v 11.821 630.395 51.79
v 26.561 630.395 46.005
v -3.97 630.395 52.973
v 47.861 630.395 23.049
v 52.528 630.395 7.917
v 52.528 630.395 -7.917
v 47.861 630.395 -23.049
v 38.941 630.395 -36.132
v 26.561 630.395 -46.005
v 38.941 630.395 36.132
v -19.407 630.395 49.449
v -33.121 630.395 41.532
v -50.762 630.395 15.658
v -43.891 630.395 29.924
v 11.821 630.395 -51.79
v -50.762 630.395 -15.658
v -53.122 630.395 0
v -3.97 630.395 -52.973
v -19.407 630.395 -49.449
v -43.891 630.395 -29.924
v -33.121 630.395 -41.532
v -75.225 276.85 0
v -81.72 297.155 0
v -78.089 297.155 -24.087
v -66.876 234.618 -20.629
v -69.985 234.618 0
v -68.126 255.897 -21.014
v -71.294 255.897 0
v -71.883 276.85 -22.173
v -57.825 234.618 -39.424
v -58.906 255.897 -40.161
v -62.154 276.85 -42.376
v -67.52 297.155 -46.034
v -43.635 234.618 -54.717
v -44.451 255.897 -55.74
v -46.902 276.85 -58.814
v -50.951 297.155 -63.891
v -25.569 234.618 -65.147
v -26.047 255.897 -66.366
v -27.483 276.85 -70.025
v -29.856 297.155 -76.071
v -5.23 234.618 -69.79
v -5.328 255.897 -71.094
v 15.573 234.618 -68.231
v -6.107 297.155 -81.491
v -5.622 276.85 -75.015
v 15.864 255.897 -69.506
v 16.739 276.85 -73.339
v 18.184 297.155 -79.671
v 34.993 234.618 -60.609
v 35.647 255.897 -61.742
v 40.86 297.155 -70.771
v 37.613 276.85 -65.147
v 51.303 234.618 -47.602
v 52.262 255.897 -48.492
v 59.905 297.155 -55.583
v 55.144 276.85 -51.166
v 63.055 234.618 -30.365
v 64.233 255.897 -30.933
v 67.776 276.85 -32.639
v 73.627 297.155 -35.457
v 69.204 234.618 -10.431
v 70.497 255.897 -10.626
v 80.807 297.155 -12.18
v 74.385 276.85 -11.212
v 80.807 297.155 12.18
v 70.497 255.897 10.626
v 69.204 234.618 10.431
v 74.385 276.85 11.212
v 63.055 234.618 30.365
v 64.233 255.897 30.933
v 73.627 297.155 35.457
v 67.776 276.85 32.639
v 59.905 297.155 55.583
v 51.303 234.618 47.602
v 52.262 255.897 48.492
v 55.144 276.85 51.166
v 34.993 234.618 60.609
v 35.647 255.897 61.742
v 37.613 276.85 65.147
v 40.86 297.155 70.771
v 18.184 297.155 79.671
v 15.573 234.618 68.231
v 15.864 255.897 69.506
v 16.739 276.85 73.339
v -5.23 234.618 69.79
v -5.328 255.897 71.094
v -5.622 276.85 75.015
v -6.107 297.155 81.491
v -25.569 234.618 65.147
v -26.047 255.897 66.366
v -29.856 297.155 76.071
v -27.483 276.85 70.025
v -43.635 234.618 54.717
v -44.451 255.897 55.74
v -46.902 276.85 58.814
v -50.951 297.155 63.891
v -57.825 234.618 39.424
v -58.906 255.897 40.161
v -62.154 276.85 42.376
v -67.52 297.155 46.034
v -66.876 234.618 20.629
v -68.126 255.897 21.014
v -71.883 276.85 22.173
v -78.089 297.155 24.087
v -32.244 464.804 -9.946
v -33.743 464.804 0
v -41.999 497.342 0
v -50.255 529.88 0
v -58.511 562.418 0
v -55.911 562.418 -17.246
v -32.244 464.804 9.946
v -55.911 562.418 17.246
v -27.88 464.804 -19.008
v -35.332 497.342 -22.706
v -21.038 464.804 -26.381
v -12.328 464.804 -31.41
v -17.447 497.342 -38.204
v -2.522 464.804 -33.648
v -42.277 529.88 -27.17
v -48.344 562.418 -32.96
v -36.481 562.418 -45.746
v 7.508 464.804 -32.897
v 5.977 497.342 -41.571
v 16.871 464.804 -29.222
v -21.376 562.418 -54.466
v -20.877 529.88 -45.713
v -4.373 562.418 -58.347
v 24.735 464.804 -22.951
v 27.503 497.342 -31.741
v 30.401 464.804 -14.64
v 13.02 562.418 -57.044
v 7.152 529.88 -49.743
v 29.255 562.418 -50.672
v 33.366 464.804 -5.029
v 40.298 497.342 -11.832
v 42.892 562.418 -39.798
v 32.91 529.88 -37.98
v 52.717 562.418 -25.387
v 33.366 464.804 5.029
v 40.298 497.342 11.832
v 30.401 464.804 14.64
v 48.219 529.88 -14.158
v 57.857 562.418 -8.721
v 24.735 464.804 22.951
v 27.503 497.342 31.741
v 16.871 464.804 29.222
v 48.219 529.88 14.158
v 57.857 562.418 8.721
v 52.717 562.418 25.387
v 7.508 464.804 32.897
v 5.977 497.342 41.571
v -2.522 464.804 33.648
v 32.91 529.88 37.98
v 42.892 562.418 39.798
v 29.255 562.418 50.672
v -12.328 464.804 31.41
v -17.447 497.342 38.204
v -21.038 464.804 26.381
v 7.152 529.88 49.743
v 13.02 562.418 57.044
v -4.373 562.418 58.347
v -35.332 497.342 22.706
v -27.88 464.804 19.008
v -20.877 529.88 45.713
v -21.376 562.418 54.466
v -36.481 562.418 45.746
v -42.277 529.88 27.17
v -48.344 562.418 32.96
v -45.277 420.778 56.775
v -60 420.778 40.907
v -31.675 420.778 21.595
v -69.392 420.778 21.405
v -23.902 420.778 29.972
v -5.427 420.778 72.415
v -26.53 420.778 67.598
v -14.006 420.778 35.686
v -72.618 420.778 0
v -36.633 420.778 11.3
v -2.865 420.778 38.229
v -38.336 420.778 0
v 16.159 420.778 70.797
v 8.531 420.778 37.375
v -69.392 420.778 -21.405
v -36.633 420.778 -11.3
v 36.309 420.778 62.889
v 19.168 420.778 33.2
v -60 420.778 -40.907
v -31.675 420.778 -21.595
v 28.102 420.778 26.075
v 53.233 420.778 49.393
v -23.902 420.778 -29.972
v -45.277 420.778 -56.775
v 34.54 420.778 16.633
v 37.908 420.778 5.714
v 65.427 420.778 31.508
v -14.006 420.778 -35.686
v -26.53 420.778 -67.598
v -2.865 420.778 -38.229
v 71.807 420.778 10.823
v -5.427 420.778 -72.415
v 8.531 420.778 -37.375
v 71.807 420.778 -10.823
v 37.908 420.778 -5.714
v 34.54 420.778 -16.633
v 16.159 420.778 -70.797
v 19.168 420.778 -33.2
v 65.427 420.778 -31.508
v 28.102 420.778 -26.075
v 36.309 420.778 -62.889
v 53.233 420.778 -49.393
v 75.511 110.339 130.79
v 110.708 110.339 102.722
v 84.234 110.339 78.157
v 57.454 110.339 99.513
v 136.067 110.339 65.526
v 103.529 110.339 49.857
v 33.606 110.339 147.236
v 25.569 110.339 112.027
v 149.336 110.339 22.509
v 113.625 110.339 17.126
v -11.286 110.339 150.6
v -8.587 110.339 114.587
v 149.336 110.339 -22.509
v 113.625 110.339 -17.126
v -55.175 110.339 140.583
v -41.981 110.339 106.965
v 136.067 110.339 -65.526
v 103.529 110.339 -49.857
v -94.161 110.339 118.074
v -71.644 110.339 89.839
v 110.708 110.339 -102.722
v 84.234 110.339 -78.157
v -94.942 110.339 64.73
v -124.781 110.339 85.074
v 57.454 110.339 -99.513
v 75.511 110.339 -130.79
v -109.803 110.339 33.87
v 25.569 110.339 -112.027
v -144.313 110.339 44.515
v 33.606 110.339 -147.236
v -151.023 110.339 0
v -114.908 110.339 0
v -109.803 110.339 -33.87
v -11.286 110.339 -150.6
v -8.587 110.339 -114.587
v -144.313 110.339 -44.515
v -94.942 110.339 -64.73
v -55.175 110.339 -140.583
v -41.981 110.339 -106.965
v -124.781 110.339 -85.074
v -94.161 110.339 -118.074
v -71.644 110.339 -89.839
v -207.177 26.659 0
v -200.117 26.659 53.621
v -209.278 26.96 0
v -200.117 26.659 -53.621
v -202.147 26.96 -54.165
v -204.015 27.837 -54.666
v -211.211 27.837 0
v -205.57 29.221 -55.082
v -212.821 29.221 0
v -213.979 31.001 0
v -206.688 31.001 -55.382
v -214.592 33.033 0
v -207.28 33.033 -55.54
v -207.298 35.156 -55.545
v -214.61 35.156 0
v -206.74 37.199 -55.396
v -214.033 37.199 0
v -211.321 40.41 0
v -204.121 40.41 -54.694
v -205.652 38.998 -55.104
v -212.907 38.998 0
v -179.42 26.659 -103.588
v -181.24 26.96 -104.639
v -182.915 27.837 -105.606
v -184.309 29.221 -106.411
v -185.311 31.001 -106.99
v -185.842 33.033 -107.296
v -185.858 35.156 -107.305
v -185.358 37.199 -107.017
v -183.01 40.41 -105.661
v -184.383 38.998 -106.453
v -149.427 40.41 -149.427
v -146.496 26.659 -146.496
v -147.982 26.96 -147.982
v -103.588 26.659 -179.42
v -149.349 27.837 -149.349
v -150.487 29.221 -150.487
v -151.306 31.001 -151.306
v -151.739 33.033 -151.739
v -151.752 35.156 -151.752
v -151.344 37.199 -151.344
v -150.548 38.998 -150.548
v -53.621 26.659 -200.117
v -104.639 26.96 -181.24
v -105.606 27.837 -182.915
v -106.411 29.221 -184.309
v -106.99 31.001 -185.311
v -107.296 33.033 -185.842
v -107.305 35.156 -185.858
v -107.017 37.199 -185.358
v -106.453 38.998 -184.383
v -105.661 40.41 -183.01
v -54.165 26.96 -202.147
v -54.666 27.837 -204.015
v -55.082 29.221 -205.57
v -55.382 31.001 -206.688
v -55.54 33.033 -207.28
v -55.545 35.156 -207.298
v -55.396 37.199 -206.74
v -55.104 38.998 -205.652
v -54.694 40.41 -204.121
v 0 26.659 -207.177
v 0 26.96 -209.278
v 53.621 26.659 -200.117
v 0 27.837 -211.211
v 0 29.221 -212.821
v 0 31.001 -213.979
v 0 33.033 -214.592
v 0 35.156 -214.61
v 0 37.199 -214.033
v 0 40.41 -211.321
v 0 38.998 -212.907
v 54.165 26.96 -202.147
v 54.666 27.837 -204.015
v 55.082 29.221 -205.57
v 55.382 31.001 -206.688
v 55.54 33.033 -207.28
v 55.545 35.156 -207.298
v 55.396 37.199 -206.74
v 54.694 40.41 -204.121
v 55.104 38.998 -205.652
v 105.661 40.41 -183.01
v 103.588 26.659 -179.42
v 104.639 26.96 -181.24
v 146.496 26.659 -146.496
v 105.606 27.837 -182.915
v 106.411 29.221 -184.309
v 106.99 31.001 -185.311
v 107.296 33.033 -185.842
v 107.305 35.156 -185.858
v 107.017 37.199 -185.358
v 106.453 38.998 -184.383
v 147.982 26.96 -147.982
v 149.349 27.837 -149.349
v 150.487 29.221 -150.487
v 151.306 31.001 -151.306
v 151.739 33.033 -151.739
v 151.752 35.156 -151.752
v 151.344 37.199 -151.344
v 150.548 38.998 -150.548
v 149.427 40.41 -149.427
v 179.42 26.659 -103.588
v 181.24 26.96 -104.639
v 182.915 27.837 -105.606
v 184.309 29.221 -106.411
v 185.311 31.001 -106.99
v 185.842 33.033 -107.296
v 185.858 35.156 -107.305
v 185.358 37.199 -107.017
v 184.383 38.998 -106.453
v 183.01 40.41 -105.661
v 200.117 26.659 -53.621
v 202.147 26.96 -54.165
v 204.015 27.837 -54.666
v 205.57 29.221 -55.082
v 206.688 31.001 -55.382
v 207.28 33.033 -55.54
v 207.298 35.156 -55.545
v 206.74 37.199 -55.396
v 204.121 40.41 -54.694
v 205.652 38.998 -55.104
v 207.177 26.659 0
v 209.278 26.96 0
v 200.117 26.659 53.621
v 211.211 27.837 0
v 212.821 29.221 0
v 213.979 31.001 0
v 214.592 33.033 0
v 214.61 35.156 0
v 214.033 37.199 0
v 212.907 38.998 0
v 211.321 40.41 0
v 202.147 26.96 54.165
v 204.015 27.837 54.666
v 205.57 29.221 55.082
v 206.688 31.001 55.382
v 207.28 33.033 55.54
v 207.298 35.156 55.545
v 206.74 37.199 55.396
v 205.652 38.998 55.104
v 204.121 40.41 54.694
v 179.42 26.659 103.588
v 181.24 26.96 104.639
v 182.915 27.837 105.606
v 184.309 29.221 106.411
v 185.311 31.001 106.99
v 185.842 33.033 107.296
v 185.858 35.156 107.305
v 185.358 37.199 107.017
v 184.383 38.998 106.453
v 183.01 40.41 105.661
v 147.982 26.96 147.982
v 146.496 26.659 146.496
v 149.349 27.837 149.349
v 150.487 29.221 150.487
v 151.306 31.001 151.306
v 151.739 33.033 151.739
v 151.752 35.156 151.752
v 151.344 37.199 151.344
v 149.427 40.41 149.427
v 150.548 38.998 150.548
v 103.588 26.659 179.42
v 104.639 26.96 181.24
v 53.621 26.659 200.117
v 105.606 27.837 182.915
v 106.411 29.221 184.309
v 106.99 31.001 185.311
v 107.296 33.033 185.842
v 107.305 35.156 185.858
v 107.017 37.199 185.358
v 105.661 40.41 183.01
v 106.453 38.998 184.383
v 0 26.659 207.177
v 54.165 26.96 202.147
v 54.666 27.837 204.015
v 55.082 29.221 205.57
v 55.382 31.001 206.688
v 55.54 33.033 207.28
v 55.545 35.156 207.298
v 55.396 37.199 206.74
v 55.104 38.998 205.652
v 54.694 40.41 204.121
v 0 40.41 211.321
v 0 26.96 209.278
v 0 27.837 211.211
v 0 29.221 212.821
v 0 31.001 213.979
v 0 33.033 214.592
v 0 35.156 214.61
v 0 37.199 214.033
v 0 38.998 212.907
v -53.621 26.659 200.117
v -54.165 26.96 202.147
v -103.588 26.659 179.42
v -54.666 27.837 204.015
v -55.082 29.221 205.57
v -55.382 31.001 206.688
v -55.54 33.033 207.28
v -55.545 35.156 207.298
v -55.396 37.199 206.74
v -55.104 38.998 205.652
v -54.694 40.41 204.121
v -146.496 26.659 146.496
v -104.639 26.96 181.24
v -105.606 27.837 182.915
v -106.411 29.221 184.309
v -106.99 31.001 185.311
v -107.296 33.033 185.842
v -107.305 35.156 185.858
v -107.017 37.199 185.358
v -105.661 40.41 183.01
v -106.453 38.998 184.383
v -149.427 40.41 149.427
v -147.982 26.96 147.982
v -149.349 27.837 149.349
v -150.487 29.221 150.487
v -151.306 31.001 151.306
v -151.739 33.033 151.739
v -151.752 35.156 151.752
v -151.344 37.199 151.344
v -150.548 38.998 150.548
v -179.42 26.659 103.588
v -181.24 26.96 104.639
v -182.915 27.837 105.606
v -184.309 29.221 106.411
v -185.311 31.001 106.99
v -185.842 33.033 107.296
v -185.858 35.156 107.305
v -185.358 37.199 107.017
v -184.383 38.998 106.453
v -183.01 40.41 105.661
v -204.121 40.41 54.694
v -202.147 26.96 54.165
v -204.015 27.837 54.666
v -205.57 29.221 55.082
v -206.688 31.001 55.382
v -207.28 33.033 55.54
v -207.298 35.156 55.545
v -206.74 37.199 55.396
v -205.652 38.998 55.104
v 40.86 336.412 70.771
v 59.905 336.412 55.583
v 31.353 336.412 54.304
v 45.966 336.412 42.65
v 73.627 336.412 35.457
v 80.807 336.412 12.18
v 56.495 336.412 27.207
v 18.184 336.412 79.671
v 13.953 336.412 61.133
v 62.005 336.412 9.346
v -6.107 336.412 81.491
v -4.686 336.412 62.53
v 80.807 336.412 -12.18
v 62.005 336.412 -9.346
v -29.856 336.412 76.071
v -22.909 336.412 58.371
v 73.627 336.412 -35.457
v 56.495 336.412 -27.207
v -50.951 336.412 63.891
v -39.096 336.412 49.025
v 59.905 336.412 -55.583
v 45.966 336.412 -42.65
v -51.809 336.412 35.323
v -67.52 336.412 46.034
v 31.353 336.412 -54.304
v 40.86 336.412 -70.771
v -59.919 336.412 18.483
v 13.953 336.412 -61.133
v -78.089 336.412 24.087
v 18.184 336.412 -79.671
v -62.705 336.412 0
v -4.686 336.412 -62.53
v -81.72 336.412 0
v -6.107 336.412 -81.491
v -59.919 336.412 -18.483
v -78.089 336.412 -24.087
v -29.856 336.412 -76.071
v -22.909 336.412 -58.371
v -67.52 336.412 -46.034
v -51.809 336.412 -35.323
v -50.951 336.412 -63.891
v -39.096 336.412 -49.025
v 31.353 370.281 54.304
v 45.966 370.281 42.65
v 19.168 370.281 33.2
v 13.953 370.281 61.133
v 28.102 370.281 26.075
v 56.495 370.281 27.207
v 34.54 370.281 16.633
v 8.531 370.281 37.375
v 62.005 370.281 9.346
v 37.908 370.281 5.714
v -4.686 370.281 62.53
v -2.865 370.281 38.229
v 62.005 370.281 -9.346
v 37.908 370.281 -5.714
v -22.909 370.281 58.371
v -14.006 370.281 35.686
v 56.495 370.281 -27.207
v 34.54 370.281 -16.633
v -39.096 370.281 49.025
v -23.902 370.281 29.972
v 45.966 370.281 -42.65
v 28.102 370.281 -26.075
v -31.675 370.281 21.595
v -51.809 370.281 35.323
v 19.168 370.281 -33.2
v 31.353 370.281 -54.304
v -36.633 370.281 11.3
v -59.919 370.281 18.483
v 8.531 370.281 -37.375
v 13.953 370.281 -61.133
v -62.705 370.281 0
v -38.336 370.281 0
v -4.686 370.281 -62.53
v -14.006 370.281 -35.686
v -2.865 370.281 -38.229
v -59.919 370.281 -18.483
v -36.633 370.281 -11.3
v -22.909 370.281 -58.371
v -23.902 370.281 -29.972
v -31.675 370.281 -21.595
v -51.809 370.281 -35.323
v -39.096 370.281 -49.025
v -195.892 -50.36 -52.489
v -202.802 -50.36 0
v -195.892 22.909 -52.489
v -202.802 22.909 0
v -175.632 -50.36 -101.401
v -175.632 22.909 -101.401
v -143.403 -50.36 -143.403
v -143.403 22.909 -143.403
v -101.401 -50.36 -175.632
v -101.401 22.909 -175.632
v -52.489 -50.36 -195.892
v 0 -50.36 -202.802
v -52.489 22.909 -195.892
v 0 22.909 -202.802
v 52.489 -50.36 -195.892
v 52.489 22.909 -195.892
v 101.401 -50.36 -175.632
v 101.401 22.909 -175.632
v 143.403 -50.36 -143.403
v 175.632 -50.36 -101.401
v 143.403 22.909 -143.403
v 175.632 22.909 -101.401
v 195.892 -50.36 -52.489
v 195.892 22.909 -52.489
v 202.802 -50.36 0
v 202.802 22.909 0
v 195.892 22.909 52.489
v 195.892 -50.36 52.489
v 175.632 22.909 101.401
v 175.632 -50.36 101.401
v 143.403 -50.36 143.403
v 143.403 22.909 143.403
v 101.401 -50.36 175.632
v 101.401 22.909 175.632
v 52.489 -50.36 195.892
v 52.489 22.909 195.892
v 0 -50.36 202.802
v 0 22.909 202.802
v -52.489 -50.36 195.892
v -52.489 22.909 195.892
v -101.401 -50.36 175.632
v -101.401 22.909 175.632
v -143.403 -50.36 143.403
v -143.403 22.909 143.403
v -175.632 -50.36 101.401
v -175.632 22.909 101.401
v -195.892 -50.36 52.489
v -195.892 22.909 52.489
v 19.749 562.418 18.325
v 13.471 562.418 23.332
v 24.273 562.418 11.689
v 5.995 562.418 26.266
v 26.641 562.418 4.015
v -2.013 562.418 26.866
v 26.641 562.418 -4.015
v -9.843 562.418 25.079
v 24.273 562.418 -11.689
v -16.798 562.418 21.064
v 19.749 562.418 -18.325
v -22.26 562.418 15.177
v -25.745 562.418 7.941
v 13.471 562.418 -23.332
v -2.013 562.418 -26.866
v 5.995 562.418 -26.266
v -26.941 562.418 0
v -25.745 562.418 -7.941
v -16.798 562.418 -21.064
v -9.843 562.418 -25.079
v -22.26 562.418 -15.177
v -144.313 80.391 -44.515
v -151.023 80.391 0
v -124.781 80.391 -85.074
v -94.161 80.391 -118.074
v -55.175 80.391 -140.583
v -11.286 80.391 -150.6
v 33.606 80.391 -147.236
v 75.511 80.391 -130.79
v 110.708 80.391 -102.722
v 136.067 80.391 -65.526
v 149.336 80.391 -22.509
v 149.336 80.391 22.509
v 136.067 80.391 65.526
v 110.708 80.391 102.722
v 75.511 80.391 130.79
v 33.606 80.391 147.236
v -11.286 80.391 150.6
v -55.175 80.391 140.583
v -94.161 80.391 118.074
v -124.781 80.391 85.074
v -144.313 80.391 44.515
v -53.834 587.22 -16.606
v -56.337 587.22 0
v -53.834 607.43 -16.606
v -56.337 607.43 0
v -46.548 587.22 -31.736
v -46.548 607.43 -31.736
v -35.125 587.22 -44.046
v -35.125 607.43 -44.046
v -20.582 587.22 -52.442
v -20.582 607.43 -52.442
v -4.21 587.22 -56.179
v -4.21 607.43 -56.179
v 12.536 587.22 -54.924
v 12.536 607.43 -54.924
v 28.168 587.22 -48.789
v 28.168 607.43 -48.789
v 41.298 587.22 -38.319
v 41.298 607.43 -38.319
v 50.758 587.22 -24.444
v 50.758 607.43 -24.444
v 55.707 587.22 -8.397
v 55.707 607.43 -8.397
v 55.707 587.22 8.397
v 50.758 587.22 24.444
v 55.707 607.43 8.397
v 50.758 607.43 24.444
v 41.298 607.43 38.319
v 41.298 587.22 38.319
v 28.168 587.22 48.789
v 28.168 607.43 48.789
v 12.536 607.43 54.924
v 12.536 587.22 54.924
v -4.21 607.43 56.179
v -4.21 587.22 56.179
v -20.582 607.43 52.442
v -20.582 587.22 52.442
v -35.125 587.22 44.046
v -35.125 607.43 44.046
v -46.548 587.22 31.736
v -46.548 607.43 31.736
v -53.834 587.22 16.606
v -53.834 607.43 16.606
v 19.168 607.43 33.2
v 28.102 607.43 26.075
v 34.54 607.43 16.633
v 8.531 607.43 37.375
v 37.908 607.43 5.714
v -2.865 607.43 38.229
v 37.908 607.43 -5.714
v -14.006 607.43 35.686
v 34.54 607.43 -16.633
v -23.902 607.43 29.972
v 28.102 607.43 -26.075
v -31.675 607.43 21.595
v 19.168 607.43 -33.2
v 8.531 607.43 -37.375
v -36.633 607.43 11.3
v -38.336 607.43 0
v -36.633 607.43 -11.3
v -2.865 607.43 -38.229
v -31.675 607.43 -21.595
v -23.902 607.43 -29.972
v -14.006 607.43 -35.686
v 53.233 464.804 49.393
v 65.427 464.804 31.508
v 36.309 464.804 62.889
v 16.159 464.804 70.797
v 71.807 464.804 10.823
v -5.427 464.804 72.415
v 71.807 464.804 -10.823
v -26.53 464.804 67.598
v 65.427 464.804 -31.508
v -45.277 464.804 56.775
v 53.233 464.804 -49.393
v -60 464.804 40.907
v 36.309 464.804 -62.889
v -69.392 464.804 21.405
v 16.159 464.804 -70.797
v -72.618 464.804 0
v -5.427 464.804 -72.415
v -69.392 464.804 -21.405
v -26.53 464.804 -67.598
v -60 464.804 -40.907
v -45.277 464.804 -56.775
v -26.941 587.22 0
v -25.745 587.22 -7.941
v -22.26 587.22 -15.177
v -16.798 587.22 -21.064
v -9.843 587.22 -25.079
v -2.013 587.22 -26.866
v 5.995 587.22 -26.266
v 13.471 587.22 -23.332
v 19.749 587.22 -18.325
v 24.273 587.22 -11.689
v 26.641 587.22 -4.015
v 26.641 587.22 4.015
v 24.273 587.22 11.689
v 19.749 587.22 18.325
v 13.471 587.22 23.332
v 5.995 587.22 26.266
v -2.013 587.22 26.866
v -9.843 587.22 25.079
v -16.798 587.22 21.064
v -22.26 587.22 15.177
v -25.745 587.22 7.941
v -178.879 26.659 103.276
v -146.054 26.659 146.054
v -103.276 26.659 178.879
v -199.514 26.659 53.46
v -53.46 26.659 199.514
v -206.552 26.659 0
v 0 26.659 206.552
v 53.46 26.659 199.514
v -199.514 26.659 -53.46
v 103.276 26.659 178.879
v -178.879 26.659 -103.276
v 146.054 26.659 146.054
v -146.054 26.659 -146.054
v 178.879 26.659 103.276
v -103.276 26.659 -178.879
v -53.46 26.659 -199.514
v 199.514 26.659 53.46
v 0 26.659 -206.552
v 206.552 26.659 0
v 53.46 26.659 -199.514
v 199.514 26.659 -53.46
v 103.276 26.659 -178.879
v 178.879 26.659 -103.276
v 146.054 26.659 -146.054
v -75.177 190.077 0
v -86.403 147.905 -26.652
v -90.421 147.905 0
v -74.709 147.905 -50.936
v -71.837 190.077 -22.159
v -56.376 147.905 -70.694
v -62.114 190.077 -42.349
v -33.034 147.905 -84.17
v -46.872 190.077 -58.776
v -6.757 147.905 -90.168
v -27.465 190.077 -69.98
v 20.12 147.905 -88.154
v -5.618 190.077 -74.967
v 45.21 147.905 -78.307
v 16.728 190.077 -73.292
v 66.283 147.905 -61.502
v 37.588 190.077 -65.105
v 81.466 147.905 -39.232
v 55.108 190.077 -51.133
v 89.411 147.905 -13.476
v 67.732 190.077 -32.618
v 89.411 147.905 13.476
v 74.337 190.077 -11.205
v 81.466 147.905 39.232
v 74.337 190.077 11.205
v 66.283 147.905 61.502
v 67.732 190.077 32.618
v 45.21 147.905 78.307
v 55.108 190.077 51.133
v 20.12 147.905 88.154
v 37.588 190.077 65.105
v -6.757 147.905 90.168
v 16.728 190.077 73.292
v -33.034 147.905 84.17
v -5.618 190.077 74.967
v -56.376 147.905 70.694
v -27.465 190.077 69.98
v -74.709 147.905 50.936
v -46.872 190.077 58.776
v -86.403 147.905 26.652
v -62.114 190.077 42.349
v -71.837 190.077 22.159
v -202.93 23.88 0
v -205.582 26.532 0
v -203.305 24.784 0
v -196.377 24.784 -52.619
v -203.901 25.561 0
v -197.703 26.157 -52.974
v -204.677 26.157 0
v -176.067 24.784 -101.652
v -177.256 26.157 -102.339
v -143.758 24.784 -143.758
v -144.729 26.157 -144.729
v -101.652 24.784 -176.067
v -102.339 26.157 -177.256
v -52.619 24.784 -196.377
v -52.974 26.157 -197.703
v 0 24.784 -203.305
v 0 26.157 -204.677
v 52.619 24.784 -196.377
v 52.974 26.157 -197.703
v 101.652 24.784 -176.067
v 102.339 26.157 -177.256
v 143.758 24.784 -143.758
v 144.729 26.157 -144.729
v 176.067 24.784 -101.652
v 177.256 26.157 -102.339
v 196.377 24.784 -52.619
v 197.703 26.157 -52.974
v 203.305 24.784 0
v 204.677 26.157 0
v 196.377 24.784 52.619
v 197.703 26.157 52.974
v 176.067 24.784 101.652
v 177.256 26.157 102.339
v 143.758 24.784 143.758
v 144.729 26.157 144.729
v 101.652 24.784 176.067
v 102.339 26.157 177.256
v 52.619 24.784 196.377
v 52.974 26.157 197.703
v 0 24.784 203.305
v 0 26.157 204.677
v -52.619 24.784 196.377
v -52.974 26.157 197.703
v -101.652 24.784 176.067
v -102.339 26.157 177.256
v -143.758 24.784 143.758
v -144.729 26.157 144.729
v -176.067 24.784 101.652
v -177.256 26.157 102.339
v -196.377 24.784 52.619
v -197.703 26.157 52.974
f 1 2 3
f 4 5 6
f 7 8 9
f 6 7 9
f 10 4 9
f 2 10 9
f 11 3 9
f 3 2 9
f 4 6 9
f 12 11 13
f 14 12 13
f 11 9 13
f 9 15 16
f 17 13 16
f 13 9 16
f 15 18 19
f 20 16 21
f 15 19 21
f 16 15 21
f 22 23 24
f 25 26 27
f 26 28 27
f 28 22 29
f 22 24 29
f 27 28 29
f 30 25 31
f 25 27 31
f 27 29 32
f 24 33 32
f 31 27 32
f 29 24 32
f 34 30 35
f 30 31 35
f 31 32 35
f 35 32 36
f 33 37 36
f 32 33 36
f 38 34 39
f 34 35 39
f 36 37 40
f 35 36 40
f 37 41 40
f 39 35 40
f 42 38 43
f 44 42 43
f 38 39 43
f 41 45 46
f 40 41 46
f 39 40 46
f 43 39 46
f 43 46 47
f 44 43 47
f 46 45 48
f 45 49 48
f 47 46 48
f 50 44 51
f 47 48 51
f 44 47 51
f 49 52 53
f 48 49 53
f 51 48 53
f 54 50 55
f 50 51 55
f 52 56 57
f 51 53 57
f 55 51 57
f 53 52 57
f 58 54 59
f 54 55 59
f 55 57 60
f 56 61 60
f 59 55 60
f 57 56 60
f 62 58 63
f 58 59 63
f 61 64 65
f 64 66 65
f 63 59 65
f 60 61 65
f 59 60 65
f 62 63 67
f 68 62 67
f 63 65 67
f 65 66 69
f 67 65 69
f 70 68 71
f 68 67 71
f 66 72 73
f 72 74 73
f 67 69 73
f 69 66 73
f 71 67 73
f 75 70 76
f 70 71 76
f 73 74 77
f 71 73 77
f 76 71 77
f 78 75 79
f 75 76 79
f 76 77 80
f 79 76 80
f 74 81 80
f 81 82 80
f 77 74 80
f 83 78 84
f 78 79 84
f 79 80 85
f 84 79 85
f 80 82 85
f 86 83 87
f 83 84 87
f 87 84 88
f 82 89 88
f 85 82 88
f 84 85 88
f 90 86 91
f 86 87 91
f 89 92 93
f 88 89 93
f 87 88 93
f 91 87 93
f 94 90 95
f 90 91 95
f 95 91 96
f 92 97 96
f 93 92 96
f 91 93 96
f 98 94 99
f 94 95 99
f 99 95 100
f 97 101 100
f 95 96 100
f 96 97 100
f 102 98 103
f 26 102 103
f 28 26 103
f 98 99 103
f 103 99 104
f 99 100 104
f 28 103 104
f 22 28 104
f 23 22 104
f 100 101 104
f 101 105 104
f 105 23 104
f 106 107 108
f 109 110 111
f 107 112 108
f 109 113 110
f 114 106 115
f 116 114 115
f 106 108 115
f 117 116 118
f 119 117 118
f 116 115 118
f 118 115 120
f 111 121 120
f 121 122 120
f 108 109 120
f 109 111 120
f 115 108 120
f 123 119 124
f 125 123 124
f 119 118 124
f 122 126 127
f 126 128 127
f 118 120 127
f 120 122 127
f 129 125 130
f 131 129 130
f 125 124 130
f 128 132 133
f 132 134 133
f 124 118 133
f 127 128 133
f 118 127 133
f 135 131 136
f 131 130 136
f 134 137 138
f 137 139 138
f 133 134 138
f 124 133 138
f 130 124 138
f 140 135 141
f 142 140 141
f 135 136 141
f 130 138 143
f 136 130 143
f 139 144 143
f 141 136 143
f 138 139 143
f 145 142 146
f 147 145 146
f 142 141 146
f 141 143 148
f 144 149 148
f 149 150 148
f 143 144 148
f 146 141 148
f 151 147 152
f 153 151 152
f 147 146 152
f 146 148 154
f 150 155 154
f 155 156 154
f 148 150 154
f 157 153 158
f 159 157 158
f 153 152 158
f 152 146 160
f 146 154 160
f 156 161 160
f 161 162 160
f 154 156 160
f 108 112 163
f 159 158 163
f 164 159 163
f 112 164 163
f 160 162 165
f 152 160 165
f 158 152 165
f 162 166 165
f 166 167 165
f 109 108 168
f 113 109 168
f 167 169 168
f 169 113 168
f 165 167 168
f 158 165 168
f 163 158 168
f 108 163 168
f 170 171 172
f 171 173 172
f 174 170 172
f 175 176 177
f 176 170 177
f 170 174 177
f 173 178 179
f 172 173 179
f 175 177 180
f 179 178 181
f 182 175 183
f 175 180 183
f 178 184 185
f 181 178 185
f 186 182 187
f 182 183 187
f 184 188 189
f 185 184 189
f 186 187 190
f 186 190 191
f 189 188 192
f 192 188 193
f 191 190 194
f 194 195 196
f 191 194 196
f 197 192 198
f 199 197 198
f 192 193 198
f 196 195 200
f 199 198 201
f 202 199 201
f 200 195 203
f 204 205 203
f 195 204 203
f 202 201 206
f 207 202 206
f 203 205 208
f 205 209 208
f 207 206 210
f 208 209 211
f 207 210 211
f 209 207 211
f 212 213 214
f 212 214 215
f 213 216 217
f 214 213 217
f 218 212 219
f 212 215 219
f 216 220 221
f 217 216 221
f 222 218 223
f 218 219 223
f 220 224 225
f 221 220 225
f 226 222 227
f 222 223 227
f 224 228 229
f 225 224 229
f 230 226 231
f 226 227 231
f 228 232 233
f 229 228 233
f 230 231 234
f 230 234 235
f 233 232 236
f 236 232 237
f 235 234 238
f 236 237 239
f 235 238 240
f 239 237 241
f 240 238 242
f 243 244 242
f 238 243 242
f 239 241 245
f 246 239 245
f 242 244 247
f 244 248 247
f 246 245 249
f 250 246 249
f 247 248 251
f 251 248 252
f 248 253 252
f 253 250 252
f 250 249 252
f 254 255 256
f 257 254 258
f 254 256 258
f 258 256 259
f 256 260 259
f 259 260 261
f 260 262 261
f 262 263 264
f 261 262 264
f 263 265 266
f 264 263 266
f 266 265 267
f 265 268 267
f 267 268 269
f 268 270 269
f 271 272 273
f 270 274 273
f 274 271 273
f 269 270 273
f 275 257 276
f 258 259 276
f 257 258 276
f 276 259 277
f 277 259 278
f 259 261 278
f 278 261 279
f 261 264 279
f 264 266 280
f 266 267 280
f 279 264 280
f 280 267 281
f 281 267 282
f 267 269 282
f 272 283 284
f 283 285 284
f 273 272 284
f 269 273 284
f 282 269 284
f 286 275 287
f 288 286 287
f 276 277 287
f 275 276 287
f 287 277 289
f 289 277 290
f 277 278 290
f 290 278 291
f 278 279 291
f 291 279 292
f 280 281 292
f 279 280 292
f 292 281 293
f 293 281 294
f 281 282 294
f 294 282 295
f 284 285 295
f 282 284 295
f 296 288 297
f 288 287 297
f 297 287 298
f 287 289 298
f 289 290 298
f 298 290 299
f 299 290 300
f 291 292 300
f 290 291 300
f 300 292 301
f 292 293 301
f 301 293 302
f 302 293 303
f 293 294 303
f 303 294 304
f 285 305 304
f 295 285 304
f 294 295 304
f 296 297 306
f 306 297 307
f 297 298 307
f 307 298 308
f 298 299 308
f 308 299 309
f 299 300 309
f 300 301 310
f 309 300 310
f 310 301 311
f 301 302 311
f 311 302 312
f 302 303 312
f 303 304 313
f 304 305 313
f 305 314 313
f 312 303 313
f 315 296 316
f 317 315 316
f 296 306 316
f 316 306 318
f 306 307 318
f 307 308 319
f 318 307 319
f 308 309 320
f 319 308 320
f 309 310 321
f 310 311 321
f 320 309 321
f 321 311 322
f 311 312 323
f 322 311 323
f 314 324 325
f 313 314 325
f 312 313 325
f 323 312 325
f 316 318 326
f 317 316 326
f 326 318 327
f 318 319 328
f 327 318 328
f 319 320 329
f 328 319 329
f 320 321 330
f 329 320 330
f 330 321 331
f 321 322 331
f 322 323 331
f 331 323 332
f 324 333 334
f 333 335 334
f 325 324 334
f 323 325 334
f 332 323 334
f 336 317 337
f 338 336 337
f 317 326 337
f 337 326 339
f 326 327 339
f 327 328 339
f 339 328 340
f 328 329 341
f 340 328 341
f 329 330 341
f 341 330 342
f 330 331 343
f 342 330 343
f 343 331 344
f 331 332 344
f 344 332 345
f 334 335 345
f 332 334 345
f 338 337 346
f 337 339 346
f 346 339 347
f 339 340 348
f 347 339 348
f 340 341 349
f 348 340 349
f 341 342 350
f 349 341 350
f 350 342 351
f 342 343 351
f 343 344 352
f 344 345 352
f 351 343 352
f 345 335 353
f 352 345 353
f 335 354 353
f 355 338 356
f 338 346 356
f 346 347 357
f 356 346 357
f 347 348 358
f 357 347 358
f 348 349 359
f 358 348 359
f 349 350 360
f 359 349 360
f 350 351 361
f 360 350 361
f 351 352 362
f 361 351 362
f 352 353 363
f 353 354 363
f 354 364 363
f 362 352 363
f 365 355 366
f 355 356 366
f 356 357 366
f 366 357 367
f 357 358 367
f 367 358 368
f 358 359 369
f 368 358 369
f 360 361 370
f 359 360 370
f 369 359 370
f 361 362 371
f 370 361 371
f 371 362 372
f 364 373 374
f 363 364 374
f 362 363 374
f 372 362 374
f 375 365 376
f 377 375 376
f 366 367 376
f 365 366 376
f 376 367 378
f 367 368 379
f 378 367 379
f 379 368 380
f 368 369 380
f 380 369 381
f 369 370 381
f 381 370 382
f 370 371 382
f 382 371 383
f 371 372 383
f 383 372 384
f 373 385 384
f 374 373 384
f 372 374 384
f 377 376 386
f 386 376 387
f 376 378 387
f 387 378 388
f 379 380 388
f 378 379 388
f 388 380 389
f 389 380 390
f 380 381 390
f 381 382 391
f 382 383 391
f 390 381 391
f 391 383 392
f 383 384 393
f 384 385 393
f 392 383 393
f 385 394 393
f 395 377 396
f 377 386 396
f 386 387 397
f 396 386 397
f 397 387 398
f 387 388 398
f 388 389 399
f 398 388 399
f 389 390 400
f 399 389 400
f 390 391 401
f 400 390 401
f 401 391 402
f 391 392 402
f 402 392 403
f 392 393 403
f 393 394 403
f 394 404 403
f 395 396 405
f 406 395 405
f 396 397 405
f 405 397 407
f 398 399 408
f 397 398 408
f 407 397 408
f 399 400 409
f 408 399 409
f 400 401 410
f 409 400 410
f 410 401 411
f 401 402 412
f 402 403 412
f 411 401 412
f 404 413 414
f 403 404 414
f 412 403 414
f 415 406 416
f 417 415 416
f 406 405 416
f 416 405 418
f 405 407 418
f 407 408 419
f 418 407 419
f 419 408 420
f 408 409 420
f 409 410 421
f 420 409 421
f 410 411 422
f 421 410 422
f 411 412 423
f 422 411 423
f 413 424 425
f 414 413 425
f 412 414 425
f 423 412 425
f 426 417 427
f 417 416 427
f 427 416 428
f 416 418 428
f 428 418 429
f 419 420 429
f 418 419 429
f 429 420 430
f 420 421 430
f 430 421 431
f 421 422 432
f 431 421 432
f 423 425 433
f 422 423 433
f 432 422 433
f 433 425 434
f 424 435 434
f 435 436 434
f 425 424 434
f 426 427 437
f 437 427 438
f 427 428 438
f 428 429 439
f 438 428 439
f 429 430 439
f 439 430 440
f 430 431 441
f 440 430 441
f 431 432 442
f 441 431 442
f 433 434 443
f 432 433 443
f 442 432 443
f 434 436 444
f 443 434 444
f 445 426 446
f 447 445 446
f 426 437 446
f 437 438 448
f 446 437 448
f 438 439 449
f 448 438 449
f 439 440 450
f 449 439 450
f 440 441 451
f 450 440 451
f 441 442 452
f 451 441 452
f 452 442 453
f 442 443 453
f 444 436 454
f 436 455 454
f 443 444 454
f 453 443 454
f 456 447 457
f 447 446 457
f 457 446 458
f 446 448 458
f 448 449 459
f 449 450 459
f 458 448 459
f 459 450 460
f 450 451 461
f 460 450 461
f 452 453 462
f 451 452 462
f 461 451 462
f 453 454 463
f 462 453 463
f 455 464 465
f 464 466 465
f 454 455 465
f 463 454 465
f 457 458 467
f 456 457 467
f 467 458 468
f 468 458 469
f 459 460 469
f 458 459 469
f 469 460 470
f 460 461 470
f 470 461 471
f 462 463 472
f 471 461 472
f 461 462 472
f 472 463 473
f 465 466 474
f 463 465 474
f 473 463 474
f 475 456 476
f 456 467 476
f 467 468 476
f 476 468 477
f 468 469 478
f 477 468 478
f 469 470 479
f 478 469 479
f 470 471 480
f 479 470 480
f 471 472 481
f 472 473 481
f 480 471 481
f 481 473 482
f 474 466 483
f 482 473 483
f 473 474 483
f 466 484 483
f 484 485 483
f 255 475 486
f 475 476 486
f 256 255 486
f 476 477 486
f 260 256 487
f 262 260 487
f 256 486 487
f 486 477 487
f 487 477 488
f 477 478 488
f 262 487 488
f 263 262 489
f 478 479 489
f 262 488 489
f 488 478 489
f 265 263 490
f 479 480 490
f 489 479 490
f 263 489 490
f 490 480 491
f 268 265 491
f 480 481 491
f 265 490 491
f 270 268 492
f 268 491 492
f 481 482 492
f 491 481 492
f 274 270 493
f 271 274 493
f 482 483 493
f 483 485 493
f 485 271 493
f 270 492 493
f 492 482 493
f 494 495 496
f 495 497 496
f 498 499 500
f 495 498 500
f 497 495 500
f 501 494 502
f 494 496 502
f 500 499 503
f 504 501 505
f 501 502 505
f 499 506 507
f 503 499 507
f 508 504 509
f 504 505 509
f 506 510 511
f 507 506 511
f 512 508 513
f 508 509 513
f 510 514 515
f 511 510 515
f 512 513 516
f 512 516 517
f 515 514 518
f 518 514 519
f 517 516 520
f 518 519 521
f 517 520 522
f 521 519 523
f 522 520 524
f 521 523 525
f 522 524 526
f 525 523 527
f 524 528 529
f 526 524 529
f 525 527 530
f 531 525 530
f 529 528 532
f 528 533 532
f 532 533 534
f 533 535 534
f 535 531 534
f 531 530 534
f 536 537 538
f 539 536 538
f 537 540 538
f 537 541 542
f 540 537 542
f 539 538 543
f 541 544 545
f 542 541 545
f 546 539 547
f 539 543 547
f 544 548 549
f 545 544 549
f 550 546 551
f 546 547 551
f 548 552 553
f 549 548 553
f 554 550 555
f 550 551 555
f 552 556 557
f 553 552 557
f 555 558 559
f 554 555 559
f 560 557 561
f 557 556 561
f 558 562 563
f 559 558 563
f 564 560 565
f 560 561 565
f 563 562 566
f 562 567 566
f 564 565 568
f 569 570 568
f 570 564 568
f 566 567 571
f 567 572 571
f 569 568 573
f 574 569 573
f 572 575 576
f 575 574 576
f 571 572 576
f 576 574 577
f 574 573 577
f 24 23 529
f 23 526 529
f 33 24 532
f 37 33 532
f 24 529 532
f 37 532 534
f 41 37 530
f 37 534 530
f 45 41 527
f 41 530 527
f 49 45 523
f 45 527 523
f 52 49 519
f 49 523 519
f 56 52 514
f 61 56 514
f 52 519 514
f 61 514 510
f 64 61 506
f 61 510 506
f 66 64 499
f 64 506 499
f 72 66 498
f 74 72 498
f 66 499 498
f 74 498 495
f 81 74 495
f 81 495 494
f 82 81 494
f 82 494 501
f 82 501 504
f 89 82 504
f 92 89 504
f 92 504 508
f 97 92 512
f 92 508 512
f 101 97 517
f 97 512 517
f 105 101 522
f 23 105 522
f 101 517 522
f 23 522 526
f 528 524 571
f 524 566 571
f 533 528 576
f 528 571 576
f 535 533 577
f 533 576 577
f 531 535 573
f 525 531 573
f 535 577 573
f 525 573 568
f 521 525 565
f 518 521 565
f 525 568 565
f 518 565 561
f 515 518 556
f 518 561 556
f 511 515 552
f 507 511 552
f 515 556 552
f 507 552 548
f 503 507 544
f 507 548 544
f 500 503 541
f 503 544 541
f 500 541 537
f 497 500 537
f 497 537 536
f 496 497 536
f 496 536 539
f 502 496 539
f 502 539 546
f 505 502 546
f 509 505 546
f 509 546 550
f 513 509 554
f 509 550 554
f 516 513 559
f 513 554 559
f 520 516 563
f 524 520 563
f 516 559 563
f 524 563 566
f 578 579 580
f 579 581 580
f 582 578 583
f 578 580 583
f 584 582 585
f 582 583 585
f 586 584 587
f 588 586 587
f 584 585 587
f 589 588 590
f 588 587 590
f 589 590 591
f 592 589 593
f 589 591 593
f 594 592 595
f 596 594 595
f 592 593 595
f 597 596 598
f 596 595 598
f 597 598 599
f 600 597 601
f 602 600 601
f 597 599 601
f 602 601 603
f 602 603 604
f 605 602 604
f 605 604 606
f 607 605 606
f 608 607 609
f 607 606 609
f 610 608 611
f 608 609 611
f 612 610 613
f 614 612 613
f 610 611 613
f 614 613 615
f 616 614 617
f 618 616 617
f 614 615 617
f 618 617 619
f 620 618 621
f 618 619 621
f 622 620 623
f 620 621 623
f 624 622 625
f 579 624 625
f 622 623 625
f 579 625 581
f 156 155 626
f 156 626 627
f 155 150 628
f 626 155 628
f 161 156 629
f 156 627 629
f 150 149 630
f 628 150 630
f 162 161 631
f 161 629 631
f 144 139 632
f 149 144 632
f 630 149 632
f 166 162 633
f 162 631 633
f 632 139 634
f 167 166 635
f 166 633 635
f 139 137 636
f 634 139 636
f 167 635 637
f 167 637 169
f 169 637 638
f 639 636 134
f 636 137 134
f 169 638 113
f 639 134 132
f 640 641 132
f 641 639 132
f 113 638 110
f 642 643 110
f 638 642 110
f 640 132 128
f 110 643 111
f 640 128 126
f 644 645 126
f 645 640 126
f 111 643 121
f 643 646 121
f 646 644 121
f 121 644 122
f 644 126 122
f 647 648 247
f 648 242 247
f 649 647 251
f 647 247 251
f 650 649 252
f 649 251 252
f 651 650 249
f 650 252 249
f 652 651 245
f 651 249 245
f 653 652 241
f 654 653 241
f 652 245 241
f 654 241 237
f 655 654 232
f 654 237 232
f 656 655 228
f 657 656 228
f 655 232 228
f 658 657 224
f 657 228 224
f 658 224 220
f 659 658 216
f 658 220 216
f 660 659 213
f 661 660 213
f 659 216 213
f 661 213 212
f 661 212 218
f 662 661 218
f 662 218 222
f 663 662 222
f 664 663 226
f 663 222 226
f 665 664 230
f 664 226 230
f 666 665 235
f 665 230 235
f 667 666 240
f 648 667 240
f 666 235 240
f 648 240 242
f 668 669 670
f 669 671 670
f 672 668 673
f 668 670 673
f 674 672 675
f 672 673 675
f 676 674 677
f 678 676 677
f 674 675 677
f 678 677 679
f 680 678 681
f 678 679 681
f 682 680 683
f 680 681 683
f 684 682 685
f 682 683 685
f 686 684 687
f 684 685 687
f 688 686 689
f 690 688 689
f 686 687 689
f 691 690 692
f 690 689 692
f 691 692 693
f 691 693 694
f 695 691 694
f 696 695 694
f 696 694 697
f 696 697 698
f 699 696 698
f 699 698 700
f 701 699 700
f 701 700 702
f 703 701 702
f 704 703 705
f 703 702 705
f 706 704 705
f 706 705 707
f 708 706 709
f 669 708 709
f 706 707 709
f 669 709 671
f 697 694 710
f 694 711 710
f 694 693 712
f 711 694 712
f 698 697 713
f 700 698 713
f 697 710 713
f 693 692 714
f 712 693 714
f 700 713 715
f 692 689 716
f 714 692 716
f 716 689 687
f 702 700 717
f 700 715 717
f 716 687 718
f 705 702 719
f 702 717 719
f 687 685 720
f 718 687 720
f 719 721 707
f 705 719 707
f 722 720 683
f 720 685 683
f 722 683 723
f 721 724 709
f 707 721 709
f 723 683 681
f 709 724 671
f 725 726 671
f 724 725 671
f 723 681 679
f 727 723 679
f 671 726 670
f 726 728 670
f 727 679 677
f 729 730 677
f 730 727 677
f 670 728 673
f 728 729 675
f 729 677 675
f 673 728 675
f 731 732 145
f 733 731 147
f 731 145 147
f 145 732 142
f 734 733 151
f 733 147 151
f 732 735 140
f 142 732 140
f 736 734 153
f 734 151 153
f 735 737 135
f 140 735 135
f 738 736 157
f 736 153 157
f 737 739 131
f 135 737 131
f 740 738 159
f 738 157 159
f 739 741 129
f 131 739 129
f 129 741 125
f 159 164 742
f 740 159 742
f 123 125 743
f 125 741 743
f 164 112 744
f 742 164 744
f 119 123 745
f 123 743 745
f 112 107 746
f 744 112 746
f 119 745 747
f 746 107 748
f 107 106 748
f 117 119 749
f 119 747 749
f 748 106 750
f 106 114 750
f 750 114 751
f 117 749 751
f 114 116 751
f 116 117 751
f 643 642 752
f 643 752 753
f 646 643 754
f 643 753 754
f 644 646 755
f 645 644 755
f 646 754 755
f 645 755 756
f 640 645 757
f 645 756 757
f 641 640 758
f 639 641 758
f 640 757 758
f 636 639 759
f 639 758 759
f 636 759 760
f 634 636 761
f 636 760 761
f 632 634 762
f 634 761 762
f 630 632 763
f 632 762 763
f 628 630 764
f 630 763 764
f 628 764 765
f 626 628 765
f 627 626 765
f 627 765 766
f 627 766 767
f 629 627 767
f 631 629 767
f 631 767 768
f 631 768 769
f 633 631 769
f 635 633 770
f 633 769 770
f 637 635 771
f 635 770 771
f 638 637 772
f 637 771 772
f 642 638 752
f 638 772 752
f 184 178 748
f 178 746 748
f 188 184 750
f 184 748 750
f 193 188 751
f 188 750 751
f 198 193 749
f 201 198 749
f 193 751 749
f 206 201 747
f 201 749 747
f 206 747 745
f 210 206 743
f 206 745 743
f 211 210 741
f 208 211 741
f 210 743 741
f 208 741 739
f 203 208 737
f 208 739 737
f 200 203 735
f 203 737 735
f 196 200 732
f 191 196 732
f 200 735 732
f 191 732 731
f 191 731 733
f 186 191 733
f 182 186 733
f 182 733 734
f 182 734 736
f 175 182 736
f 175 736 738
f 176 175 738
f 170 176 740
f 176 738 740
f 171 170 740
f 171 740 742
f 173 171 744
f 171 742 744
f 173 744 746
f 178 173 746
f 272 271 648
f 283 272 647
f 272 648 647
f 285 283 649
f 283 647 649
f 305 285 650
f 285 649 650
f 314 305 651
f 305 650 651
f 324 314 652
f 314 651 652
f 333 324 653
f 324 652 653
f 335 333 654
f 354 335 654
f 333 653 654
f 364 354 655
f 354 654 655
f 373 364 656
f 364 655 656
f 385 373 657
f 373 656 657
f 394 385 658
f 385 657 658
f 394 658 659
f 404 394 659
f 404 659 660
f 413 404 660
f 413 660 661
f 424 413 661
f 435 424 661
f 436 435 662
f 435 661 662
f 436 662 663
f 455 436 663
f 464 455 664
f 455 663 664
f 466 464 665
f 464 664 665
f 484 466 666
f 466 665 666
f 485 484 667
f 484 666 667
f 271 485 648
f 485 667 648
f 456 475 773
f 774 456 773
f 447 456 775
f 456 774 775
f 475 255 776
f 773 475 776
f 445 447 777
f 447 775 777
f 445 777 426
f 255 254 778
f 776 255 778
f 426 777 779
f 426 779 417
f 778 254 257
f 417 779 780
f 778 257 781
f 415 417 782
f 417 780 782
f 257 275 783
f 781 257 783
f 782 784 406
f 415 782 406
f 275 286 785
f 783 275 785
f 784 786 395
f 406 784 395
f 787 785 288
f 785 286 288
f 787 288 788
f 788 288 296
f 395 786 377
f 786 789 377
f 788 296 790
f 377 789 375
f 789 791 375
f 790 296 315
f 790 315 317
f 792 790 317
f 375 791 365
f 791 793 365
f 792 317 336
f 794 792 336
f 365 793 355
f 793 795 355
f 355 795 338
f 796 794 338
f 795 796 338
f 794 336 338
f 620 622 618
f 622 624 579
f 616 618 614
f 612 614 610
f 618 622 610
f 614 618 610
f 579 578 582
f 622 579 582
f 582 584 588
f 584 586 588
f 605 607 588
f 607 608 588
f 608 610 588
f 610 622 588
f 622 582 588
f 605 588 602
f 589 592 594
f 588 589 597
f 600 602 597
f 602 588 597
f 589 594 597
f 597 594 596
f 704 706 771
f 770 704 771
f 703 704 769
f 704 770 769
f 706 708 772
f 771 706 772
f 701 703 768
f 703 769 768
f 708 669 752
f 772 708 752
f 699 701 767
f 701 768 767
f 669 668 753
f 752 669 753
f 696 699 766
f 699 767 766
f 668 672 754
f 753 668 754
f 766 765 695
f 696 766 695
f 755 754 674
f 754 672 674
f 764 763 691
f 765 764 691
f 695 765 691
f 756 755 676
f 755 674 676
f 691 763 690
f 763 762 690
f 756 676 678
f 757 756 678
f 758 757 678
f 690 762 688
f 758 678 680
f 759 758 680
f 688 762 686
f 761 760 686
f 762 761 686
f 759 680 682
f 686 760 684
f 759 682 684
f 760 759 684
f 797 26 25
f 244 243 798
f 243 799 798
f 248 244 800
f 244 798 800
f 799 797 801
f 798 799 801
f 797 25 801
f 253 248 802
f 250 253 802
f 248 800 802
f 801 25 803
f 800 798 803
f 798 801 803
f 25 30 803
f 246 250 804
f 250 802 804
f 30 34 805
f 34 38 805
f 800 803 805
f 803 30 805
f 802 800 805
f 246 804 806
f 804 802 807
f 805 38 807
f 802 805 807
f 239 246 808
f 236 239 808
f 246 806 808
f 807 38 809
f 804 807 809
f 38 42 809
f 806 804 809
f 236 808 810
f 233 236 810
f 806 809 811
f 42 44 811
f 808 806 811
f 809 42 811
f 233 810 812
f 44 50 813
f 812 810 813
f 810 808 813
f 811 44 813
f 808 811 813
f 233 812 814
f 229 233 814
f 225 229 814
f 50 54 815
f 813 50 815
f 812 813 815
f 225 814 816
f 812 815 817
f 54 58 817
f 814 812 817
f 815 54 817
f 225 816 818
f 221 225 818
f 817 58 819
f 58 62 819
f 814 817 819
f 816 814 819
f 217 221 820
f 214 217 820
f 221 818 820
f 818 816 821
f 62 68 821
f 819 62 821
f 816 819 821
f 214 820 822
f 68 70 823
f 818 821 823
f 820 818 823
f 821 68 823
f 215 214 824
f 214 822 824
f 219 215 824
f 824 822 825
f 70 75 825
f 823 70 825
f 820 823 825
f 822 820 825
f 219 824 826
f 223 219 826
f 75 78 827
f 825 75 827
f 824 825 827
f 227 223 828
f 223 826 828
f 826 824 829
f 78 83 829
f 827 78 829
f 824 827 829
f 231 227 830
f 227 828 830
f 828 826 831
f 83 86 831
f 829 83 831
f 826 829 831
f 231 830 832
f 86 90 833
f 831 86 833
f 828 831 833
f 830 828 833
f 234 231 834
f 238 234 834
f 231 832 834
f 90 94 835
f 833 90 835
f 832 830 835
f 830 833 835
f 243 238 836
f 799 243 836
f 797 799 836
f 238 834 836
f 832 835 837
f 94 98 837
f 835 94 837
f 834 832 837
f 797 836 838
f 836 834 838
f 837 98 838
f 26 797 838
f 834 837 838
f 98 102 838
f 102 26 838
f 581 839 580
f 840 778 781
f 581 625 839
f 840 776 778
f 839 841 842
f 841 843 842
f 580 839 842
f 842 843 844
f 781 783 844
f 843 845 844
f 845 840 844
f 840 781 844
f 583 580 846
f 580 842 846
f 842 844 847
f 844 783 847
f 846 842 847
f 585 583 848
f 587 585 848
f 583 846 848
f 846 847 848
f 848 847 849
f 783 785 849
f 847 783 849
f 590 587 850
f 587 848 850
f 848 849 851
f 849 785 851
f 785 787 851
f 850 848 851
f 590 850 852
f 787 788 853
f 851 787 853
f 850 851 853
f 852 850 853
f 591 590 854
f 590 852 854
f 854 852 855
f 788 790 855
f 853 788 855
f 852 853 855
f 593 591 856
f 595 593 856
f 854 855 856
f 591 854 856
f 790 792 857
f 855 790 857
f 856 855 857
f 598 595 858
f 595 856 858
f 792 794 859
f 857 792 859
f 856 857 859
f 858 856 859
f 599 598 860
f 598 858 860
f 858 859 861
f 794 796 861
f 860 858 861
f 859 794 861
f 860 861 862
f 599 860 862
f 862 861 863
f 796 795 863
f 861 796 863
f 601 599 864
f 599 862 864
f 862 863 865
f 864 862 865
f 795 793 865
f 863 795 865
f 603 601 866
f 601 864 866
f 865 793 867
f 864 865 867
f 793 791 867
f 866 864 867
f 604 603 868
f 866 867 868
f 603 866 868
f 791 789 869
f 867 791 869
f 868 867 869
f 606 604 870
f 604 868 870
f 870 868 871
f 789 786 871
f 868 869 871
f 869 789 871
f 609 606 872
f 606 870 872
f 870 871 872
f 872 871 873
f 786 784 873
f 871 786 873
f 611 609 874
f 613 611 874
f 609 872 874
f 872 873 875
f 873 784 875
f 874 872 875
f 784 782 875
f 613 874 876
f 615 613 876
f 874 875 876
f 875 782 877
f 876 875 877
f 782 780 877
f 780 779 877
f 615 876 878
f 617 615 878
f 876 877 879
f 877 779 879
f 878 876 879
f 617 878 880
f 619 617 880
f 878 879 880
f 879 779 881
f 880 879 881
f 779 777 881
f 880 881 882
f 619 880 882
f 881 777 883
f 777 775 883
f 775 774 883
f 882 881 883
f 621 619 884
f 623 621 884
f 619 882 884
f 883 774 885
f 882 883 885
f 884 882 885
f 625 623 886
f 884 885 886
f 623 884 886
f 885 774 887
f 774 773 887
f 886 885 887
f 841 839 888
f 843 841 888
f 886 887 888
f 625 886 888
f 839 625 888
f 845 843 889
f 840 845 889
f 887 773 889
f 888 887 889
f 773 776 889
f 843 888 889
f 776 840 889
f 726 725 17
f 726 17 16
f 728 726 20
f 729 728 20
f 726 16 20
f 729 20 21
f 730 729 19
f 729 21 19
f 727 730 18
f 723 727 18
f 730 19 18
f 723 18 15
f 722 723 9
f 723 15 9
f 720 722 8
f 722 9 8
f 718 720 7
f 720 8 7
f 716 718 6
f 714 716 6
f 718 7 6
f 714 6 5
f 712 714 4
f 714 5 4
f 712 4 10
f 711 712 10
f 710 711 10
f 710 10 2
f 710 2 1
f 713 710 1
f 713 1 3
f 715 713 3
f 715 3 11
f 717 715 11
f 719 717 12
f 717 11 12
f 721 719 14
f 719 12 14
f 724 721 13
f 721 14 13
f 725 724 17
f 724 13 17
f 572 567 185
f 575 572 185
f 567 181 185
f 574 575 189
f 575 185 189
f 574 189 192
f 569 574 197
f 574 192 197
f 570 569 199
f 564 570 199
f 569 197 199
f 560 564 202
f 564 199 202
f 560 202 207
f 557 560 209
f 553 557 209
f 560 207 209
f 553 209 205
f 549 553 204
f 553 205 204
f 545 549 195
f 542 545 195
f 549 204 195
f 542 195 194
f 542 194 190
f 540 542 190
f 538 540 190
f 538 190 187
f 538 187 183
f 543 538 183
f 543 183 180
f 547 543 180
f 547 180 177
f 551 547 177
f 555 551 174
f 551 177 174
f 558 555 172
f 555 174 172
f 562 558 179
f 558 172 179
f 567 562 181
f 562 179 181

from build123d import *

# Parameters (mm, degrees)
SCALE_1_SCALE = 1.5


with BuildPart() as part:
    # 草圖2 → 旋轉1 (revolve)
    with BuildSketch(Plane.XY, mode=Mode.PRIVATE) as revolve_1_sk:
        with BuildLine():
            Line((0, 0), (135.201465244, 0))
            Line((135.201465244, 0), (135.201465244, 48.846470305))
            ThreePointArc((135.201465244, 48.846470305), (135.933698291, 50.614237258), (137.701465244, 51.346470305))
            Line((137.701465244, 51.346470305), (138.117818628, 51.346470305))
            ThreePointArc((138.117818628, 51.346470305), (142.905095232, 54.903562575), (140.880857994, 60.513677218))
            Line((140.880857994, 60.513677218), (100.681841945, 87.167372643))
            Line((100.681841945, 87.167372643), (100.681841945, 107.133121487))
            Line((100.681841945, 107.133121487), (76.60549775, 107.133121487))
            ThreePointArc((76.60549775, 107.133121487), (54.387004145, 145.940882587), (46.656874484, 189.985733309))
            ThreePointArc((46.656874484, 189.985733309), (48.623022714, 211.196335783), (54.479774894, 231.676908287))
            Line((54.479774894, 231.676908287), (54.479774894, 257.848515079))
            Line((54.479774894, 257.848515079), (41.803489055, 257.848515079))
            Line((41.803489055, 257.848515079), (41.803489055, 280.427838471))
            Line((41.803489055, 280.427838471), (25.557390517, 280.427838471))
            Line((25.557390517, 280.427838471), (25.557390517, 314.091902385))
            Line((25.557390517, 314.091902385), (48.412071511, 314.091902385))
            Line((48.412071511, 314.091902385), (48.412071511, 343.442796825))
            Line((48.412071511, 343.442796825), (22.495215746, 343.442796825))
            Line((22.495215746, 343.442796825), (39.007295277, 408.518950092))
            Line((39.007295277, 408.518950092), (17.96096835, 408.518950092))
            Line((17.96096835, 408.518950092), (17.96096835, 425.053771457))
            Line((17.96096835, 425.053771457), (37.557793671, 425.053771457))
            Line((37.557793671, 425.053771457), (37.557793671, 438.526588864))
            Line((37.557793671, 438.526588864), (25.557390517, 438.526588864))
            Line((25.557390517, 438.526588864), (35.414390901, 453.836608646))
            Line((35.414390901, 453.836608646), (0, 453.836608646))
            Line((0, 453.836608646), (0, 0))
        make_face()
    revolve(revolve_1_sk.sketch.rotate(Axis((0, 453.836608646, 0), (0, -1, 0)), 180), axis=Axis((0, 453.836608646, 0), (0, -1, 0)))


with BuildPart() as part_1:
    # 縮放比例1: scaled about (0, 100.72058529, 0)
    add(part.part.scale(SCALE_1_SCALE).moved(Location((0, -50.360292645, 0))))


solid = part_1.part
